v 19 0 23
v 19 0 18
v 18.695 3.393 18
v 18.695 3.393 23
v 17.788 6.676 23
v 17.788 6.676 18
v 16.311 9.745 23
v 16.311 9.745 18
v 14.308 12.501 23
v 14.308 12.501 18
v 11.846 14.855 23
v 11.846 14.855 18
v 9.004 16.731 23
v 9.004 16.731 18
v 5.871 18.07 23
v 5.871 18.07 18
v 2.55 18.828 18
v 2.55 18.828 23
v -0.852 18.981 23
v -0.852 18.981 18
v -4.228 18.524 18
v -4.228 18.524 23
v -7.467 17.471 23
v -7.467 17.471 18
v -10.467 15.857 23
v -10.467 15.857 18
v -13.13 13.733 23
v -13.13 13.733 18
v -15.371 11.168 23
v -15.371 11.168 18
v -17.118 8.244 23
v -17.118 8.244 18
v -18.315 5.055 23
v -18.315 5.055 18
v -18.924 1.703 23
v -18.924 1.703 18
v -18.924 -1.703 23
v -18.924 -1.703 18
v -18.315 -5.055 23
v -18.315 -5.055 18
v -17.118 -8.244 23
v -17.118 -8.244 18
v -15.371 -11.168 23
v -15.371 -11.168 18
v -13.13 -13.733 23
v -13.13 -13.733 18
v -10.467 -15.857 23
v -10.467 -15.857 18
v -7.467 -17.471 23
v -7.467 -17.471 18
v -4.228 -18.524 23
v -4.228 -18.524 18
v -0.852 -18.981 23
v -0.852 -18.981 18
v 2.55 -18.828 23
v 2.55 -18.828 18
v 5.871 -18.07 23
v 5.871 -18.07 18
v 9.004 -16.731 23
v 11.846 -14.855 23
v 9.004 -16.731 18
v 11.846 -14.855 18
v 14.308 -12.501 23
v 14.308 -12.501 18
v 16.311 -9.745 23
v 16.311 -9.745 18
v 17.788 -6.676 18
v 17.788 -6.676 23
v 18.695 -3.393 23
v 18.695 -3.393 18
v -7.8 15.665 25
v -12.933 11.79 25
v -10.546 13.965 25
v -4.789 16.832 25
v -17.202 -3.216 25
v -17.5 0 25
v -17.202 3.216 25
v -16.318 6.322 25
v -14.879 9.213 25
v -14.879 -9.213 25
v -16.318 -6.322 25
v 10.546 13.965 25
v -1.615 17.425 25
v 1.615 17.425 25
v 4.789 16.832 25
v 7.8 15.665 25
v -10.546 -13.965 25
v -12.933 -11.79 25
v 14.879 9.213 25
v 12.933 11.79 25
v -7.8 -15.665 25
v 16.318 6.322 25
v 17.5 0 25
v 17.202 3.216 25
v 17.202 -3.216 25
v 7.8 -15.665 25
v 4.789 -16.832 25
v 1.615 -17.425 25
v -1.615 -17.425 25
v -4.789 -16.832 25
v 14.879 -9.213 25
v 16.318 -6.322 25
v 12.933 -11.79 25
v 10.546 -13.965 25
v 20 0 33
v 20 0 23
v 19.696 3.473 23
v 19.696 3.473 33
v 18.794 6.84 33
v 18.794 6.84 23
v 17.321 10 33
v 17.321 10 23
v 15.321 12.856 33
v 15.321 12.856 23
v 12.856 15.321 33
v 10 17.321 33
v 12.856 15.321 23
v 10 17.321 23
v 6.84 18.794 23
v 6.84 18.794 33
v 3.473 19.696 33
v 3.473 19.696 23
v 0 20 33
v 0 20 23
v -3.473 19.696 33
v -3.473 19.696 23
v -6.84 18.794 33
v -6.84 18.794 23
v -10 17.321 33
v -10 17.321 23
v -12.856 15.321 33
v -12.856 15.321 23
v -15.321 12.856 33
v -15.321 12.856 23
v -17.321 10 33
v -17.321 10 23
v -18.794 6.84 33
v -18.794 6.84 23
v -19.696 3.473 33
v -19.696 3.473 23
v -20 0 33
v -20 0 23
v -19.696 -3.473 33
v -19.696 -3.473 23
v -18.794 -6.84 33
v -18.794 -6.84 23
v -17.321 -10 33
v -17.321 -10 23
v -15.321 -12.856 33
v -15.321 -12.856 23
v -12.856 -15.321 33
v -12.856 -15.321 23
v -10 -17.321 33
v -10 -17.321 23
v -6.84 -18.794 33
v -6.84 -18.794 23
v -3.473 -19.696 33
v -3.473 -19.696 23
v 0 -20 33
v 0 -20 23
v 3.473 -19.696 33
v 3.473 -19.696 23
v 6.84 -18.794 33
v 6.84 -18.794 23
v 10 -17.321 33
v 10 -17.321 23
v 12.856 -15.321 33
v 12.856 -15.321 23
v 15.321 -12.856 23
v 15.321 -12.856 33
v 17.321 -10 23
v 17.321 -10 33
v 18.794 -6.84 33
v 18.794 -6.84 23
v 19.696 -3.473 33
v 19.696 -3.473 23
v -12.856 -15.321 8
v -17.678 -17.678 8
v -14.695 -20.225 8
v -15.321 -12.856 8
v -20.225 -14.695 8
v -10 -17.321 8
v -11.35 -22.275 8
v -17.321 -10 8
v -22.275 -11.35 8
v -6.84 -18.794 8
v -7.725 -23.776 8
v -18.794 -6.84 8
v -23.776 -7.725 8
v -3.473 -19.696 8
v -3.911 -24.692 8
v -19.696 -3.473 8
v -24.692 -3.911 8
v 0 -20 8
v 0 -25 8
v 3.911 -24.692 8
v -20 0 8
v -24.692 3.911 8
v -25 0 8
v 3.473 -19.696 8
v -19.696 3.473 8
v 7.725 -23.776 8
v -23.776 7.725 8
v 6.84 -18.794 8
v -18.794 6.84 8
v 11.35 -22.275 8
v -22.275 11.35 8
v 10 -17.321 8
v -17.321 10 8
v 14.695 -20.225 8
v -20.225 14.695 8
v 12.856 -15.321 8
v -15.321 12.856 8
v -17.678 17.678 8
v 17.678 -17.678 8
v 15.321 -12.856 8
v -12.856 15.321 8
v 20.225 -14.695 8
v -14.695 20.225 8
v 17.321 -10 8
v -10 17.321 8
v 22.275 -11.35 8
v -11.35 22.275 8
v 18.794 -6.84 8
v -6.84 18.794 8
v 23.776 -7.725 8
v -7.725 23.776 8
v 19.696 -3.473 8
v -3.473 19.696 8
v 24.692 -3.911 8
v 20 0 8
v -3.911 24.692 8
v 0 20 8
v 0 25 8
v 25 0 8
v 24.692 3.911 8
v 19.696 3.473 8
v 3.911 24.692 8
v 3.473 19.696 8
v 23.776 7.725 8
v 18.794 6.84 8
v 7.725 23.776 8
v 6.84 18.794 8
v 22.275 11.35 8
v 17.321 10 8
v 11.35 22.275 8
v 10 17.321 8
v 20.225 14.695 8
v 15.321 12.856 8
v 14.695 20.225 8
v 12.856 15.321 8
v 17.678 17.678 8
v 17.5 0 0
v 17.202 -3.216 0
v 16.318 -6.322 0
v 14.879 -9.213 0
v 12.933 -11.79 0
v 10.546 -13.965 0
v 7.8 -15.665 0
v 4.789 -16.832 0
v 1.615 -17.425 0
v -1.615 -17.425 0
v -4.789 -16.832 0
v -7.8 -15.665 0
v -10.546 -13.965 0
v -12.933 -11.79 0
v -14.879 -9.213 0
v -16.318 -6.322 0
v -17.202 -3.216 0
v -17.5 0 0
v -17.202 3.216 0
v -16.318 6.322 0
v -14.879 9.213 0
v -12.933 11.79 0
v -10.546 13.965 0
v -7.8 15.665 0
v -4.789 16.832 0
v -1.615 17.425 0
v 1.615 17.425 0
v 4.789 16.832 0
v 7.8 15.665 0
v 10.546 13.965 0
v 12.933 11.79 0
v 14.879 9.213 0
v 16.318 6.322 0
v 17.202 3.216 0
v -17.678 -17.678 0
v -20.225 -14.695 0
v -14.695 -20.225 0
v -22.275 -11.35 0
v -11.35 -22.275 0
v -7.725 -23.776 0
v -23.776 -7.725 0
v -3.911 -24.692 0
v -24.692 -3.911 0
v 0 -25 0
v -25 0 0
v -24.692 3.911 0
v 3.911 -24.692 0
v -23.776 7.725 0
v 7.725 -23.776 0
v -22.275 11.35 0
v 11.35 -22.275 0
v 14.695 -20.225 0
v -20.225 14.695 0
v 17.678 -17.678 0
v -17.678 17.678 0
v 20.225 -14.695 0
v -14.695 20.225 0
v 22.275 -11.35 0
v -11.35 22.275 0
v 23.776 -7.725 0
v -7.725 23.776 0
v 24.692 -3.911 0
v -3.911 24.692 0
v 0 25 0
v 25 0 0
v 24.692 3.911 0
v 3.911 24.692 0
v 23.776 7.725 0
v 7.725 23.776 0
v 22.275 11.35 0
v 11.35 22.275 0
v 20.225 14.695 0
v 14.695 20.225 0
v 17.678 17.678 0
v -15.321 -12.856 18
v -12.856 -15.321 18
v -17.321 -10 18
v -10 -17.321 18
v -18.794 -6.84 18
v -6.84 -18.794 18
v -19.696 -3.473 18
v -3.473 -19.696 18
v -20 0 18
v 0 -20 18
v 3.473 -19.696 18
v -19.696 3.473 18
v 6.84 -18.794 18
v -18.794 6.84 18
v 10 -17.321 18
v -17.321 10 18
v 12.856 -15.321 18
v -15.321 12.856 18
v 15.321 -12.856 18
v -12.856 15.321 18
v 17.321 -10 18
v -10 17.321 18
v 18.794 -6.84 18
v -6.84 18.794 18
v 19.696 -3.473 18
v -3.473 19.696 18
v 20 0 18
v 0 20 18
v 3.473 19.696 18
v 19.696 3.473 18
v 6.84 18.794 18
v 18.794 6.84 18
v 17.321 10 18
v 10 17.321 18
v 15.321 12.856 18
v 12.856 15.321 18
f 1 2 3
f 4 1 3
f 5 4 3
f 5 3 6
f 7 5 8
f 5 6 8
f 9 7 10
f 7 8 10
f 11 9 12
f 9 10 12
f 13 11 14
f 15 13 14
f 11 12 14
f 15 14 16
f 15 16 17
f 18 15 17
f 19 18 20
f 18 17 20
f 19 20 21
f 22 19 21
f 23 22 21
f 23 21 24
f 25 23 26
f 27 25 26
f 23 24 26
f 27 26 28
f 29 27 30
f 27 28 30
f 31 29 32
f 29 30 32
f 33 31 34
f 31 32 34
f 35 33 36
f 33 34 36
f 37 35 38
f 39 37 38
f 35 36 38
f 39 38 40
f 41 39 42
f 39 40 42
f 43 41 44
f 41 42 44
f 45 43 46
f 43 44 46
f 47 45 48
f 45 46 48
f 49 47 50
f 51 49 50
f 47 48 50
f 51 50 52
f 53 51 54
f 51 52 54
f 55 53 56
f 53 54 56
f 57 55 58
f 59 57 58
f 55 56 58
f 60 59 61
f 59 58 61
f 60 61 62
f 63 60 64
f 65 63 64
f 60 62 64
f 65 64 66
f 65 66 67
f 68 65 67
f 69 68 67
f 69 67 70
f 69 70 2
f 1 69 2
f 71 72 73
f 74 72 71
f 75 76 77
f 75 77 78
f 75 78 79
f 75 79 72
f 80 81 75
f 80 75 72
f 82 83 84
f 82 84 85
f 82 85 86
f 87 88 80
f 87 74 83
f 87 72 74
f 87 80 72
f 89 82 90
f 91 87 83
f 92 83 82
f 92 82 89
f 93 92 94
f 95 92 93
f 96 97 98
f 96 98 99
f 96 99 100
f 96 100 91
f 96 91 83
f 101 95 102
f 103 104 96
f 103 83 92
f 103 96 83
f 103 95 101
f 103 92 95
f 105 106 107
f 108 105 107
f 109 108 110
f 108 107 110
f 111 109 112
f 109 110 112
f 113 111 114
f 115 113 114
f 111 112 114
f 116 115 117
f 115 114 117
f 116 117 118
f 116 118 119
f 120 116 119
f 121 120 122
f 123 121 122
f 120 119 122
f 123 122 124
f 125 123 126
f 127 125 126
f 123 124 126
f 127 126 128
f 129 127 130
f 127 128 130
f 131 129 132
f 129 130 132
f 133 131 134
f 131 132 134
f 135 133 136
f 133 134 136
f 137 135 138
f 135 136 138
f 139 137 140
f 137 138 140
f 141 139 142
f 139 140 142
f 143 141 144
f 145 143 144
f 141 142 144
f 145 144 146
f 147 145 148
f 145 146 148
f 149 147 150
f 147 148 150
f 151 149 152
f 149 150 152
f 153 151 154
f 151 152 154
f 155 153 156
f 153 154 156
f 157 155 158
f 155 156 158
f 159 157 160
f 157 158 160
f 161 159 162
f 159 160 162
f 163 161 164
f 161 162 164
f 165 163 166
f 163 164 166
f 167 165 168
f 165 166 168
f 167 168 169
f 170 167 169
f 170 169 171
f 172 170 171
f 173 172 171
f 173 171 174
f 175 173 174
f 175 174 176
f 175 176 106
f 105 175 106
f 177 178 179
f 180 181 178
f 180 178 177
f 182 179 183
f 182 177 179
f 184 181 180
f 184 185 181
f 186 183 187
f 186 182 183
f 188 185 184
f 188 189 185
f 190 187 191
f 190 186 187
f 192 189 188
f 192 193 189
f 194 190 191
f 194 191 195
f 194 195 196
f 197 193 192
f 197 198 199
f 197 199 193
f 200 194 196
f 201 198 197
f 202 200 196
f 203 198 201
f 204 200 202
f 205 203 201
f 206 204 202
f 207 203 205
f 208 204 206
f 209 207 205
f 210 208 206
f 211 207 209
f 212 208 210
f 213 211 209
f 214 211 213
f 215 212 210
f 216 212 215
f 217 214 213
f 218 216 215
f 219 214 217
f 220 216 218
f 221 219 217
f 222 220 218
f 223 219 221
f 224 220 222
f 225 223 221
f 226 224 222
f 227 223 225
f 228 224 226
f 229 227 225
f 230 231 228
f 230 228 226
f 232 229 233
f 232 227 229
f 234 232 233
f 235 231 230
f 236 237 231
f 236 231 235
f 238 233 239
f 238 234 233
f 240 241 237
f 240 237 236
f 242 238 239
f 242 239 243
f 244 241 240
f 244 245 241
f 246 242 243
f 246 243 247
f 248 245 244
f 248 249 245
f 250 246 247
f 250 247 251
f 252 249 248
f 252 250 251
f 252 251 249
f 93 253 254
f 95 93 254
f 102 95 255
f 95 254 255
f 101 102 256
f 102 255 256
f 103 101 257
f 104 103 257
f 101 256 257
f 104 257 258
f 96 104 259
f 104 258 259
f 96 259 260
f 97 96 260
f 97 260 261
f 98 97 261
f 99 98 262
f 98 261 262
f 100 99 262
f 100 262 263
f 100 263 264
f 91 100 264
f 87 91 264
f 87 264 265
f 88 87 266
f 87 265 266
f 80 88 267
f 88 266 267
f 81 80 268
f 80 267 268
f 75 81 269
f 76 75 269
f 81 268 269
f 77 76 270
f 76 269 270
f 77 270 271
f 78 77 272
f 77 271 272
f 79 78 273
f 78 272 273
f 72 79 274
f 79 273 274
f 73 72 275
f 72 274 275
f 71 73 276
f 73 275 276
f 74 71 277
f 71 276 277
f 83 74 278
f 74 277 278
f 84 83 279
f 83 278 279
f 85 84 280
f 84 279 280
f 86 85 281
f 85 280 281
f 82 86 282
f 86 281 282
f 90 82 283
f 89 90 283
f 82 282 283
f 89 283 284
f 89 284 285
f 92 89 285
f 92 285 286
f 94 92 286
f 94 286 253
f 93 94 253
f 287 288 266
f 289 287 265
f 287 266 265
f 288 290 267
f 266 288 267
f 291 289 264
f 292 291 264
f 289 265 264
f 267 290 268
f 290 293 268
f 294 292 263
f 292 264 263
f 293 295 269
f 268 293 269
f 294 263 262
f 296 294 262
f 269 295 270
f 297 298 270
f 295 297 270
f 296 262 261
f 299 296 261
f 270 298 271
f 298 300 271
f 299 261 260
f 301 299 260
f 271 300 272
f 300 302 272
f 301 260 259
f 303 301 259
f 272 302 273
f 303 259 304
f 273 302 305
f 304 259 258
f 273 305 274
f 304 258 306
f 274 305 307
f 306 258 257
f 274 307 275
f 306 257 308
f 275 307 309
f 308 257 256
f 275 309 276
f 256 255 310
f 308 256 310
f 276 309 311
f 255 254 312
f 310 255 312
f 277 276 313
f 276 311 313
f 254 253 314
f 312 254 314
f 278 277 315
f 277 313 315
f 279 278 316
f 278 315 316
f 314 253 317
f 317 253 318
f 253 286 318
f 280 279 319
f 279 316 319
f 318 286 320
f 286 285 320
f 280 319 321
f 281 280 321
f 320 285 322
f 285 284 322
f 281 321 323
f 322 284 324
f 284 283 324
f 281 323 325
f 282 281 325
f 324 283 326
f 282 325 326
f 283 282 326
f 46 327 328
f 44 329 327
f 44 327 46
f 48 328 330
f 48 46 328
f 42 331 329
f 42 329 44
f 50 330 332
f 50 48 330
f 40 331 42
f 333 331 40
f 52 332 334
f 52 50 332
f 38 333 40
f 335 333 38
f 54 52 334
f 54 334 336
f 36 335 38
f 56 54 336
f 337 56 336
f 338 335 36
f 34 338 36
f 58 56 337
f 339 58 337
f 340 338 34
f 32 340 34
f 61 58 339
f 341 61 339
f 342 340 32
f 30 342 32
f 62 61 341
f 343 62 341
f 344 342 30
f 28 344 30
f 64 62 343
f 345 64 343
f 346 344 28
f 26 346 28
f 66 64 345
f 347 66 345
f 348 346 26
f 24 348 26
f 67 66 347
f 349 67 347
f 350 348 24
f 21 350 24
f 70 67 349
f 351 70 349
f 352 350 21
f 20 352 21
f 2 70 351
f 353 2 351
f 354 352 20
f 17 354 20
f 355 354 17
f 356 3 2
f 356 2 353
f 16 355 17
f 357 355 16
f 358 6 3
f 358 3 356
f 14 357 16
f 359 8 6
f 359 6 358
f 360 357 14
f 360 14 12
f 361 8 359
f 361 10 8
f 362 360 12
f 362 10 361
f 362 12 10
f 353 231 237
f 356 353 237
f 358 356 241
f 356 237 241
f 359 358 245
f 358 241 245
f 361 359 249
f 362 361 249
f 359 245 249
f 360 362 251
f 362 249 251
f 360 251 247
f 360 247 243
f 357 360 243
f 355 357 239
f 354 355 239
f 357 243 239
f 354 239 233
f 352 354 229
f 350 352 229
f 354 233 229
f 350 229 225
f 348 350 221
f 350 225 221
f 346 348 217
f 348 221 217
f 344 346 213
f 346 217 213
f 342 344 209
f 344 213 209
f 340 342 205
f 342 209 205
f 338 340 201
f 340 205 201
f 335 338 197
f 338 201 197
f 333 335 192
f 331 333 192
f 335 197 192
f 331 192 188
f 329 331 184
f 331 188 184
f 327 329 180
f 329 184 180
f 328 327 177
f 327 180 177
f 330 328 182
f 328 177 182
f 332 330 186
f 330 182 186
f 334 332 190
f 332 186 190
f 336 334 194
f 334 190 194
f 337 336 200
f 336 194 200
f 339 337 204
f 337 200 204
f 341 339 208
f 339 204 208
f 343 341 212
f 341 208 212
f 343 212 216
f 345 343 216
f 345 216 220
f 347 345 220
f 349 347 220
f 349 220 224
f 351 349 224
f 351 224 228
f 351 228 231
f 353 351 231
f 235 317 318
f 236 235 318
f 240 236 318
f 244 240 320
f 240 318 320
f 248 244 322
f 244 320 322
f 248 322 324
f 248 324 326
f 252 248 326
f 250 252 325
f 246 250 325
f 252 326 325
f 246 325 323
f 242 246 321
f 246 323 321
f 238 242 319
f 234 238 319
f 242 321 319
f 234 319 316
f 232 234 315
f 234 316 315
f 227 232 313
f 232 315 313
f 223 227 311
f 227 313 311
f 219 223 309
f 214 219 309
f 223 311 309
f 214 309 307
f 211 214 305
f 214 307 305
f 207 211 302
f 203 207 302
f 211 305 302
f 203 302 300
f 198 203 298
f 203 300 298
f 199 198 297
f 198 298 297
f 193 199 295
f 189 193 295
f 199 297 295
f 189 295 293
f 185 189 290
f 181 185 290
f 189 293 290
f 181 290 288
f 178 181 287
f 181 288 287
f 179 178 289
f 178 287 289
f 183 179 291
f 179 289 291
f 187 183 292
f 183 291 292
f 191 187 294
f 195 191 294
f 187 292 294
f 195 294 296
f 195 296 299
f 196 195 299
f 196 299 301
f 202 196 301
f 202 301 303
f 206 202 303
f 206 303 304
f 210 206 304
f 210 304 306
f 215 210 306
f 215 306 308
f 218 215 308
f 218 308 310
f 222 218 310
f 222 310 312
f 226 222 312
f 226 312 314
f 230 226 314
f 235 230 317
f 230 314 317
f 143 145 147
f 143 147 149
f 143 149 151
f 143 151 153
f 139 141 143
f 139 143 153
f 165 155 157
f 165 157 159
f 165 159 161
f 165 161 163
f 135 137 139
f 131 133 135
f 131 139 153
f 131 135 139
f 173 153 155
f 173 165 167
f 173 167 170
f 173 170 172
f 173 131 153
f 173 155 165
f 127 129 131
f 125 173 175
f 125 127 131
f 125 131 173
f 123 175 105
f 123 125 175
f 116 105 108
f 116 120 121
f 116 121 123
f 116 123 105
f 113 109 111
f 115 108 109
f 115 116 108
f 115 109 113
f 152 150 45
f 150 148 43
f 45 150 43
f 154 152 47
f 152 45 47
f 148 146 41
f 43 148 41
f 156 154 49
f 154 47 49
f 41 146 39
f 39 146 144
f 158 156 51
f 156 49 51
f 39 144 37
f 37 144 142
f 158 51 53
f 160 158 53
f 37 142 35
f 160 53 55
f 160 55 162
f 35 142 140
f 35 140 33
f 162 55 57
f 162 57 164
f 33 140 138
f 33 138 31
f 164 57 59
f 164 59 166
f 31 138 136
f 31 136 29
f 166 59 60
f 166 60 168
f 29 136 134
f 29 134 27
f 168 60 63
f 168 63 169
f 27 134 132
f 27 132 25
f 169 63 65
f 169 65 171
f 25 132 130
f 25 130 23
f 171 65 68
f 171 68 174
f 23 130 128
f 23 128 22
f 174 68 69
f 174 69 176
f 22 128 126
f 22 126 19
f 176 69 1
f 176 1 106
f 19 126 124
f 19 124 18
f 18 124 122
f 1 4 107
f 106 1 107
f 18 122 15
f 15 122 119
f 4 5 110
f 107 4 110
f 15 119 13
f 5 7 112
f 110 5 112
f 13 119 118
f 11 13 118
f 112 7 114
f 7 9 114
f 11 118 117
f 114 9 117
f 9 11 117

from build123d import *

# Parameters (mm, degrees)
F0_R     = 25
F1_DEPTH = 8
F2_R     = 20
F3_DEPTH = 10
F4_R     = 19
F5_DEPTH = 5
F6_R     = 20
F7_DEPTH = 10
F8_R     = 17.5
F9_DEPTH = 25


with BuildPart() as f1:
    # F0 (on Top) → F1 (new body)
    with BuildSketch(Plane.XY):
        Circle(F0_R)
    extrude(amount=F1_DEPTH)



with BuildPart() as f3:
    # F2 (on face) → F3 (new body)
    with BuildSketch(Plane.XY.offset(23)):
        Circle(F2_R)
    extrude(amount=F3_DEPTH)

    # F4 (on face) → F5 (join)
    with BuildSketch(Plane.XY.offset(18)):
        Circle(F4_R)
    extrude(amount=F5_DEPTH)


with BuildPart() as f1_1:
    add(f1.part)

    add(f3.part)  # F7 merges F3
    # F6 (on face) → F7 (join)
    with BuildSketch(Plane.XY.offset(8)):
        Circle(F6_R)
    extrude(amount=F7_DEPTH)

    # F8 (on face) → F9 (cut)
    with BuildSketch(Plane(origin=(0, 0, 0), x_dir=(1, 0, 0), z_dir=(0, 0, -1))):
        Circle(F8_R)
    extrude(amount=-F9_DEPTH, mode=Mode.SUBTRACT)


solid = f1_1.part
